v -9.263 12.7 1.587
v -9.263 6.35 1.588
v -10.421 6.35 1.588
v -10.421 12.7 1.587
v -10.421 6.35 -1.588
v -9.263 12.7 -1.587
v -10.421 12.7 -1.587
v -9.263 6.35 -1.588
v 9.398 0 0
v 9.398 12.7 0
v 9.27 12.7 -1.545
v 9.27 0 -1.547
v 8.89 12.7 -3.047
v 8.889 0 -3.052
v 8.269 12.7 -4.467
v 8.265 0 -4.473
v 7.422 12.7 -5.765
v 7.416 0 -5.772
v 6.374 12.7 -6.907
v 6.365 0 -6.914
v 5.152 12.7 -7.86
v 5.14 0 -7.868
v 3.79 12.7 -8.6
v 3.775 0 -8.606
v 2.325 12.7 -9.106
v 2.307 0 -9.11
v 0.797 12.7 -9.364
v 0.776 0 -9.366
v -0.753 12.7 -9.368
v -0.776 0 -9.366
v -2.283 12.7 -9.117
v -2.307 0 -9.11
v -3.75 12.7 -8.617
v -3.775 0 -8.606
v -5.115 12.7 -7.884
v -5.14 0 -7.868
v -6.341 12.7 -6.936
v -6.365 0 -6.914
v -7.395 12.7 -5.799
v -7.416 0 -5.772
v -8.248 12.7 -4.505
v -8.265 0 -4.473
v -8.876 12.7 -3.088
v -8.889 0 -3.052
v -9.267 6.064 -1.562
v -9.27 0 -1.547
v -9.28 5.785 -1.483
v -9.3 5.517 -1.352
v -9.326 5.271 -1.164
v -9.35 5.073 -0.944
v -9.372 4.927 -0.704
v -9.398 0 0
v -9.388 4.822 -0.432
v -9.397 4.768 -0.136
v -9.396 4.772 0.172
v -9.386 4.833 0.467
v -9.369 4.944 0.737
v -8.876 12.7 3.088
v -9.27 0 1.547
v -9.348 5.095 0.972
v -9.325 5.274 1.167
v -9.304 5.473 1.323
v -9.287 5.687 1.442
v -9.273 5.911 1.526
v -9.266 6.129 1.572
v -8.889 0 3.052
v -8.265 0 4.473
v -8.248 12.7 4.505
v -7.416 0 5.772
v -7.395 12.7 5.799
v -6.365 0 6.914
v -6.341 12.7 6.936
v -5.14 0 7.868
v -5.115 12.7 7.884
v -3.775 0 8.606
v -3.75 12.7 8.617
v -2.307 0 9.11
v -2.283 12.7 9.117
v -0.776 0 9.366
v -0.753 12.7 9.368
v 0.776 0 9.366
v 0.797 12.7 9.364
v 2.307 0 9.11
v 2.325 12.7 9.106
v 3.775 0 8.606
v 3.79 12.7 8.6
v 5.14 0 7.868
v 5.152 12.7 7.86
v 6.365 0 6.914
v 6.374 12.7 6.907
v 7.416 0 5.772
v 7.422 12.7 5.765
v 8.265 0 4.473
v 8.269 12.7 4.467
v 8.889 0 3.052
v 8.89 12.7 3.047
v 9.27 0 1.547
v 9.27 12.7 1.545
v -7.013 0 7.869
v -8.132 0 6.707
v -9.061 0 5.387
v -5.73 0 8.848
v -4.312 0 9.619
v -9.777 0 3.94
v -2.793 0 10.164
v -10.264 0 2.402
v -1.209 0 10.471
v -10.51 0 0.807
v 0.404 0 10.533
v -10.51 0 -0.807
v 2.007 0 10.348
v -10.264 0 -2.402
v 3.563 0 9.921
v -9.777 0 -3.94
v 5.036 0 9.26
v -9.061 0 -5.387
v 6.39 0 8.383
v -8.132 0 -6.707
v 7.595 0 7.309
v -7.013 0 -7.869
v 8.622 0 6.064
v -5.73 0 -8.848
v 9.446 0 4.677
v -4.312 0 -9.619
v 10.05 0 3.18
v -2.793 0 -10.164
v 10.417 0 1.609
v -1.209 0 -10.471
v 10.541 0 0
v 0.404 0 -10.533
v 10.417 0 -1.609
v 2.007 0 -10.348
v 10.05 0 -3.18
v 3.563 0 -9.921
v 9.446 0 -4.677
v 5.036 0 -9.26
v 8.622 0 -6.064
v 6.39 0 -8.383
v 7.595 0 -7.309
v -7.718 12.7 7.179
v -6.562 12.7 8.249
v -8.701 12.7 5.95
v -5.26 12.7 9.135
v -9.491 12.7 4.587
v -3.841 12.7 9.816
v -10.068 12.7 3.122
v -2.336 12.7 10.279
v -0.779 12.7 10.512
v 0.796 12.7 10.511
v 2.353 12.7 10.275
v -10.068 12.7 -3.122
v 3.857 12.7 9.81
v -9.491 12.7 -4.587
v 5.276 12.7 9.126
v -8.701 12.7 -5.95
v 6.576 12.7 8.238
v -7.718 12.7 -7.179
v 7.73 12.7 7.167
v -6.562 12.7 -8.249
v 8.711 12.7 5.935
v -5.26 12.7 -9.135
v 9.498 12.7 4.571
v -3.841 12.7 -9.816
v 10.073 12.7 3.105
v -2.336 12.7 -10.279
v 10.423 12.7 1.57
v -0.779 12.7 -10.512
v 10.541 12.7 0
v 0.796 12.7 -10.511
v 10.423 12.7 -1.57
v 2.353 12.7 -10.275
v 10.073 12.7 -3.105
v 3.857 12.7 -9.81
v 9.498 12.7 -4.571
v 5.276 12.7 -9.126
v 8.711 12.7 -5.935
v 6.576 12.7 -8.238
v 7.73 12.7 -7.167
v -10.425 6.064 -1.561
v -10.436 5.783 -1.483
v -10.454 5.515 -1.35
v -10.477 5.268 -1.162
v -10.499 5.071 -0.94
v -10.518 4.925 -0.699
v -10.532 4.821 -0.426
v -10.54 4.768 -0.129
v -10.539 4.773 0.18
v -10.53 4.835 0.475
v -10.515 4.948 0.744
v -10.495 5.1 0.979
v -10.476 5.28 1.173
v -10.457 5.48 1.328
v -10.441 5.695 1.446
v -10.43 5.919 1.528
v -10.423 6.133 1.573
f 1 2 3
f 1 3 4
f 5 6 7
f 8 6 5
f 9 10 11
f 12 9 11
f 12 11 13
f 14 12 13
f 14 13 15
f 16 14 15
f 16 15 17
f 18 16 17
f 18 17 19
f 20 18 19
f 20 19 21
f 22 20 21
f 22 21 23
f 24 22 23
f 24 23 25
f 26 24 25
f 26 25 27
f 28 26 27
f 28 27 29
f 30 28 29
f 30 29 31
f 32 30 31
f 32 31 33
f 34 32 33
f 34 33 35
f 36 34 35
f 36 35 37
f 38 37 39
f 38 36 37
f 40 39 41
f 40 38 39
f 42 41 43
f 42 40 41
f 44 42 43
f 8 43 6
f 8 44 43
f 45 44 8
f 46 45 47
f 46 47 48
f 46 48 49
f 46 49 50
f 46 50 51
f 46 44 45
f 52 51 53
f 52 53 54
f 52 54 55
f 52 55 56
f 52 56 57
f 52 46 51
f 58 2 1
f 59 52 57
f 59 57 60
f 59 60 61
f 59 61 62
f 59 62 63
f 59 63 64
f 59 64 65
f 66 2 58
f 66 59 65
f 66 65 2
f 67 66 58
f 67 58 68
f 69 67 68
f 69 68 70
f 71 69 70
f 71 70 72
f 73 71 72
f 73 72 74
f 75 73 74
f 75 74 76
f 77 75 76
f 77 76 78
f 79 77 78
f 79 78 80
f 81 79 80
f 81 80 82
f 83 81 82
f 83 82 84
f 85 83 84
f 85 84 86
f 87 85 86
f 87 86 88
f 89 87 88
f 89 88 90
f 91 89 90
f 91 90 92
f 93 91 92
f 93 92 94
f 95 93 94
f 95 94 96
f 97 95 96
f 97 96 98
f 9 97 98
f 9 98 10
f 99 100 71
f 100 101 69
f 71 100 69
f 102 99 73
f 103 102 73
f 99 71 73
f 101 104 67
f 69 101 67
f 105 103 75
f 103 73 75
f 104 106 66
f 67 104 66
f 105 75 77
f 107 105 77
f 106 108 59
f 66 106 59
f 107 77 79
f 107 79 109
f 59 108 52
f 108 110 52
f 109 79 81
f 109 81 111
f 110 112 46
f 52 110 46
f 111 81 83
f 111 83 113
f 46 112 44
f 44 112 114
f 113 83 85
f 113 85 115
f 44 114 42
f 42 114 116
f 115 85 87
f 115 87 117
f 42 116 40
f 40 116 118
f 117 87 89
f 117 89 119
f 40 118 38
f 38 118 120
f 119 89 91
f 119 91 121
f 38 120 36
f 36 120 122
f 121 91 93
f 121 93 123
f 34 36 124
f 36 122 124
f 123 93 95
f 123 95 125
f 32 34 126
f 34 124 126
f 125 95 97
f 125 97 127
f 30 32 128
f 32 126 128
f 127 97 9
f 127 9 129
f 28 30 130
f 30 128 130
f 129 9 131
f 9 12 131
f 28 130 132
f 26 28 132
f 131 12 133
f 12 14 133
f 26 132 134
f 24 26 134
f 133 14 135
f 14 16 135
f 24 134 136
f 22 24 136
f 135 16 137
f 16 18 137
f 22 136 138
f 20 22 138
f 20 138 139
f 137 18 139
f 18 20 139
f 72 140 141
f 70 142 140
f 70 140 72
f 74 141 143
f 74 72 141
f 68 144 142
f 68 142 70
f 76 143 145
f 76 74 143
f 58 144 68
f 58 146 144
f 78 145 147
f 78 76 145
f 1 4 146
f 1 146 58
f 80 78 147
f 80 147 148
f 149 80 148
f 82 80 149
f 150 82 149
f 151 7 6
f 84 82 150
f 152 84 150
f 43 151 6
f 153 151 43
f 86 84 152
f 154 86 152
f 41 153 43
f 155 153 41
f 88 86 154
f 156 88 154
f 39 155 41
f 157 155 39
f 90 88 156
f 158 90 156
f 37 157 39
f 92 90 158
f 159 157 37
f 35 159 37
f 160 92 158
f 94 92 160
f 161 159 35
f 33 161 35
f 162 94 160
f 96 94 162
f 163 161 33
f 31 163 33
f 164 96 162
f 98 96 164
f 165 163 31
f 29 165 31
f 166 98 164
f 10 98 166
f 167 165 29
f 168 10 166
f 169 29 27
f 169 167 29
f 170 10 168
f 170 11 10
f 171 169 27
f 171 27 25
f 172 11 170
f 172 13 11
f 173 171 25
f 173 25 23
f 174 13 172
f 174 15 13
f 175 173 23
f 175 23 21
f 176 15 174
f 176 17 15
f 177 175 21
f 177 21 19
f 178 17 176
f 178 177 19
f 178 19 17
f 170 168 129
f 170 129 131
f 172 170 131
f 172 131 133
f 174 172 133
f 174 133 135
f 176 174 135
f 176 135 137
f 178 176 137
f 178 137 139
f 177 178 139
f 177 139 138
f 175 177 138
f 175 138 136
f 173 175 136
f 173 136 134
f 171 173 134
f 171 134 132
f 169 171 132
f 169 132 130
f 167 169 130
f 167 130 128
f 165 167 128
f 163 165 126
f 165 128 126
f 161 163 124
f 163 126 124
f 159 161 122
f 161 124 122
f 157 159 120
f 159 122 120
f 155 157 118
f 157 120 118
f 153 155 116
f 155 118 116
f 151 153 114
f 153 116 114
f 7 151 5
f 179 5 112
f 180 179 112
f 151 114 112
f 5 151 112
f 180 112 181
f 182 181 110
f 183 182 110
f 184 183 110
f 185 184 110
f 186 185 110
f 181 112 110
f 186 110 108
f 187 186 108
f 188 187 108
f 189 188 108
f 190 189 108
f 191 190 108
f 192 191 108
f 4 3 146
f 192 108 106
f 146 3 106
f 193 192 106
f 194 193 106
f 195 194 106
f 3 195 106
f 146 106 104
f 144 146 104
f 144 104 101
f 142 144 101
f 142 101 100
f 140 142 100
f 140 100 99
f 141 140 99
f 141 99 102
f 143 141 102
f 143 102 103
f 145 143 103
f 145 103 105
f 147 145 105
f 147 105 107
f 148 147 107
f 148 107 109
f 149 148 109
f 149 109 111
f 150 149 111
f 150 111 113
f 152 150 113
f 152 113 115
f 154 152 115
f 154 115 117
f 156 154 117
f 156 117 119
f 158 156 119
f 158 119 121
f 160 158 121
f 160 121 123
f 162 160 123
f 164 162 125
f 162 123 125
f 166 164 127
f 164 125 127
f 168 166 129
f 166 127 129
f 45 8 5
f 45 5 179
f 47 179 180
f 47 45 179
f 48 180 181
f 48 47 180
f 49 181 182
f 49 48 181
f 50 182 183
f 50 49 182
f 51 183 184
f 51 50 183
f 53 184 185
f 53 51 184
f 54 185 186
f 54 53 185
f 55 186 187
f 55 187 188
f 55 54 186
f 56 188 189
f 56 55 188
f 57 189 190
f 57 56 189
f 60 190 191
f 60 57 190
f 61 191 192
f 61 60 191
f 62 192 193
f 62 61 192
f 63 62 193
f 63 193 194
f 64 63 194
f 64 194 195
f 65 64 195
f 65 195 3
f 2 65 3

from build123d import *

# Parameters (mm, degrees)
SKETCH1_R           = 10.541
SKETCH1_R_2         = 9.398
BOSS_EXTRUDE1_DEPTH = 12.7
CUT_EXTRUDE1_DEPTH  = 12.7


with BuildPart() as part:
    # Sketch1 → Boss-Extrude1 (new body)
    with BuildSketch(Plane(origin=(0, 0, 0), x_dir=(1, 0, 0), z_dir=(0, 1, 0))):
        Circle(SKETCH1_R)
        Circle(SKETCH1_R_2, mode=Mode.SUBTRACT)
    extrude(amount=BOSS_EXTRUDE1_DEPTH)

    # Sketch2 → Cut-Extrude1 (cut)
    with BuildSketch(Plane(origin=(0, 0, 0), x_dir=(0, 0, -1), z_dir=(1, 0, 0))):
        with BuildLine():
            Line((-1.5875, 12.7), (1.5875, 12.7))
            Line((1.5875, 12.7), (1.5875, 6.35))
            ThreePointArc((1.5875, 6.35), (0, 4.7625), (-1.5875, 6.35))
            Line((-1.5875, 6.35), (-1.5875, 12.7))
        make_face()
    extrude(amount=-CUT_EXTRUDE1_DEPTH, mode=Mode.SUBTRACT)


solid = part.part
